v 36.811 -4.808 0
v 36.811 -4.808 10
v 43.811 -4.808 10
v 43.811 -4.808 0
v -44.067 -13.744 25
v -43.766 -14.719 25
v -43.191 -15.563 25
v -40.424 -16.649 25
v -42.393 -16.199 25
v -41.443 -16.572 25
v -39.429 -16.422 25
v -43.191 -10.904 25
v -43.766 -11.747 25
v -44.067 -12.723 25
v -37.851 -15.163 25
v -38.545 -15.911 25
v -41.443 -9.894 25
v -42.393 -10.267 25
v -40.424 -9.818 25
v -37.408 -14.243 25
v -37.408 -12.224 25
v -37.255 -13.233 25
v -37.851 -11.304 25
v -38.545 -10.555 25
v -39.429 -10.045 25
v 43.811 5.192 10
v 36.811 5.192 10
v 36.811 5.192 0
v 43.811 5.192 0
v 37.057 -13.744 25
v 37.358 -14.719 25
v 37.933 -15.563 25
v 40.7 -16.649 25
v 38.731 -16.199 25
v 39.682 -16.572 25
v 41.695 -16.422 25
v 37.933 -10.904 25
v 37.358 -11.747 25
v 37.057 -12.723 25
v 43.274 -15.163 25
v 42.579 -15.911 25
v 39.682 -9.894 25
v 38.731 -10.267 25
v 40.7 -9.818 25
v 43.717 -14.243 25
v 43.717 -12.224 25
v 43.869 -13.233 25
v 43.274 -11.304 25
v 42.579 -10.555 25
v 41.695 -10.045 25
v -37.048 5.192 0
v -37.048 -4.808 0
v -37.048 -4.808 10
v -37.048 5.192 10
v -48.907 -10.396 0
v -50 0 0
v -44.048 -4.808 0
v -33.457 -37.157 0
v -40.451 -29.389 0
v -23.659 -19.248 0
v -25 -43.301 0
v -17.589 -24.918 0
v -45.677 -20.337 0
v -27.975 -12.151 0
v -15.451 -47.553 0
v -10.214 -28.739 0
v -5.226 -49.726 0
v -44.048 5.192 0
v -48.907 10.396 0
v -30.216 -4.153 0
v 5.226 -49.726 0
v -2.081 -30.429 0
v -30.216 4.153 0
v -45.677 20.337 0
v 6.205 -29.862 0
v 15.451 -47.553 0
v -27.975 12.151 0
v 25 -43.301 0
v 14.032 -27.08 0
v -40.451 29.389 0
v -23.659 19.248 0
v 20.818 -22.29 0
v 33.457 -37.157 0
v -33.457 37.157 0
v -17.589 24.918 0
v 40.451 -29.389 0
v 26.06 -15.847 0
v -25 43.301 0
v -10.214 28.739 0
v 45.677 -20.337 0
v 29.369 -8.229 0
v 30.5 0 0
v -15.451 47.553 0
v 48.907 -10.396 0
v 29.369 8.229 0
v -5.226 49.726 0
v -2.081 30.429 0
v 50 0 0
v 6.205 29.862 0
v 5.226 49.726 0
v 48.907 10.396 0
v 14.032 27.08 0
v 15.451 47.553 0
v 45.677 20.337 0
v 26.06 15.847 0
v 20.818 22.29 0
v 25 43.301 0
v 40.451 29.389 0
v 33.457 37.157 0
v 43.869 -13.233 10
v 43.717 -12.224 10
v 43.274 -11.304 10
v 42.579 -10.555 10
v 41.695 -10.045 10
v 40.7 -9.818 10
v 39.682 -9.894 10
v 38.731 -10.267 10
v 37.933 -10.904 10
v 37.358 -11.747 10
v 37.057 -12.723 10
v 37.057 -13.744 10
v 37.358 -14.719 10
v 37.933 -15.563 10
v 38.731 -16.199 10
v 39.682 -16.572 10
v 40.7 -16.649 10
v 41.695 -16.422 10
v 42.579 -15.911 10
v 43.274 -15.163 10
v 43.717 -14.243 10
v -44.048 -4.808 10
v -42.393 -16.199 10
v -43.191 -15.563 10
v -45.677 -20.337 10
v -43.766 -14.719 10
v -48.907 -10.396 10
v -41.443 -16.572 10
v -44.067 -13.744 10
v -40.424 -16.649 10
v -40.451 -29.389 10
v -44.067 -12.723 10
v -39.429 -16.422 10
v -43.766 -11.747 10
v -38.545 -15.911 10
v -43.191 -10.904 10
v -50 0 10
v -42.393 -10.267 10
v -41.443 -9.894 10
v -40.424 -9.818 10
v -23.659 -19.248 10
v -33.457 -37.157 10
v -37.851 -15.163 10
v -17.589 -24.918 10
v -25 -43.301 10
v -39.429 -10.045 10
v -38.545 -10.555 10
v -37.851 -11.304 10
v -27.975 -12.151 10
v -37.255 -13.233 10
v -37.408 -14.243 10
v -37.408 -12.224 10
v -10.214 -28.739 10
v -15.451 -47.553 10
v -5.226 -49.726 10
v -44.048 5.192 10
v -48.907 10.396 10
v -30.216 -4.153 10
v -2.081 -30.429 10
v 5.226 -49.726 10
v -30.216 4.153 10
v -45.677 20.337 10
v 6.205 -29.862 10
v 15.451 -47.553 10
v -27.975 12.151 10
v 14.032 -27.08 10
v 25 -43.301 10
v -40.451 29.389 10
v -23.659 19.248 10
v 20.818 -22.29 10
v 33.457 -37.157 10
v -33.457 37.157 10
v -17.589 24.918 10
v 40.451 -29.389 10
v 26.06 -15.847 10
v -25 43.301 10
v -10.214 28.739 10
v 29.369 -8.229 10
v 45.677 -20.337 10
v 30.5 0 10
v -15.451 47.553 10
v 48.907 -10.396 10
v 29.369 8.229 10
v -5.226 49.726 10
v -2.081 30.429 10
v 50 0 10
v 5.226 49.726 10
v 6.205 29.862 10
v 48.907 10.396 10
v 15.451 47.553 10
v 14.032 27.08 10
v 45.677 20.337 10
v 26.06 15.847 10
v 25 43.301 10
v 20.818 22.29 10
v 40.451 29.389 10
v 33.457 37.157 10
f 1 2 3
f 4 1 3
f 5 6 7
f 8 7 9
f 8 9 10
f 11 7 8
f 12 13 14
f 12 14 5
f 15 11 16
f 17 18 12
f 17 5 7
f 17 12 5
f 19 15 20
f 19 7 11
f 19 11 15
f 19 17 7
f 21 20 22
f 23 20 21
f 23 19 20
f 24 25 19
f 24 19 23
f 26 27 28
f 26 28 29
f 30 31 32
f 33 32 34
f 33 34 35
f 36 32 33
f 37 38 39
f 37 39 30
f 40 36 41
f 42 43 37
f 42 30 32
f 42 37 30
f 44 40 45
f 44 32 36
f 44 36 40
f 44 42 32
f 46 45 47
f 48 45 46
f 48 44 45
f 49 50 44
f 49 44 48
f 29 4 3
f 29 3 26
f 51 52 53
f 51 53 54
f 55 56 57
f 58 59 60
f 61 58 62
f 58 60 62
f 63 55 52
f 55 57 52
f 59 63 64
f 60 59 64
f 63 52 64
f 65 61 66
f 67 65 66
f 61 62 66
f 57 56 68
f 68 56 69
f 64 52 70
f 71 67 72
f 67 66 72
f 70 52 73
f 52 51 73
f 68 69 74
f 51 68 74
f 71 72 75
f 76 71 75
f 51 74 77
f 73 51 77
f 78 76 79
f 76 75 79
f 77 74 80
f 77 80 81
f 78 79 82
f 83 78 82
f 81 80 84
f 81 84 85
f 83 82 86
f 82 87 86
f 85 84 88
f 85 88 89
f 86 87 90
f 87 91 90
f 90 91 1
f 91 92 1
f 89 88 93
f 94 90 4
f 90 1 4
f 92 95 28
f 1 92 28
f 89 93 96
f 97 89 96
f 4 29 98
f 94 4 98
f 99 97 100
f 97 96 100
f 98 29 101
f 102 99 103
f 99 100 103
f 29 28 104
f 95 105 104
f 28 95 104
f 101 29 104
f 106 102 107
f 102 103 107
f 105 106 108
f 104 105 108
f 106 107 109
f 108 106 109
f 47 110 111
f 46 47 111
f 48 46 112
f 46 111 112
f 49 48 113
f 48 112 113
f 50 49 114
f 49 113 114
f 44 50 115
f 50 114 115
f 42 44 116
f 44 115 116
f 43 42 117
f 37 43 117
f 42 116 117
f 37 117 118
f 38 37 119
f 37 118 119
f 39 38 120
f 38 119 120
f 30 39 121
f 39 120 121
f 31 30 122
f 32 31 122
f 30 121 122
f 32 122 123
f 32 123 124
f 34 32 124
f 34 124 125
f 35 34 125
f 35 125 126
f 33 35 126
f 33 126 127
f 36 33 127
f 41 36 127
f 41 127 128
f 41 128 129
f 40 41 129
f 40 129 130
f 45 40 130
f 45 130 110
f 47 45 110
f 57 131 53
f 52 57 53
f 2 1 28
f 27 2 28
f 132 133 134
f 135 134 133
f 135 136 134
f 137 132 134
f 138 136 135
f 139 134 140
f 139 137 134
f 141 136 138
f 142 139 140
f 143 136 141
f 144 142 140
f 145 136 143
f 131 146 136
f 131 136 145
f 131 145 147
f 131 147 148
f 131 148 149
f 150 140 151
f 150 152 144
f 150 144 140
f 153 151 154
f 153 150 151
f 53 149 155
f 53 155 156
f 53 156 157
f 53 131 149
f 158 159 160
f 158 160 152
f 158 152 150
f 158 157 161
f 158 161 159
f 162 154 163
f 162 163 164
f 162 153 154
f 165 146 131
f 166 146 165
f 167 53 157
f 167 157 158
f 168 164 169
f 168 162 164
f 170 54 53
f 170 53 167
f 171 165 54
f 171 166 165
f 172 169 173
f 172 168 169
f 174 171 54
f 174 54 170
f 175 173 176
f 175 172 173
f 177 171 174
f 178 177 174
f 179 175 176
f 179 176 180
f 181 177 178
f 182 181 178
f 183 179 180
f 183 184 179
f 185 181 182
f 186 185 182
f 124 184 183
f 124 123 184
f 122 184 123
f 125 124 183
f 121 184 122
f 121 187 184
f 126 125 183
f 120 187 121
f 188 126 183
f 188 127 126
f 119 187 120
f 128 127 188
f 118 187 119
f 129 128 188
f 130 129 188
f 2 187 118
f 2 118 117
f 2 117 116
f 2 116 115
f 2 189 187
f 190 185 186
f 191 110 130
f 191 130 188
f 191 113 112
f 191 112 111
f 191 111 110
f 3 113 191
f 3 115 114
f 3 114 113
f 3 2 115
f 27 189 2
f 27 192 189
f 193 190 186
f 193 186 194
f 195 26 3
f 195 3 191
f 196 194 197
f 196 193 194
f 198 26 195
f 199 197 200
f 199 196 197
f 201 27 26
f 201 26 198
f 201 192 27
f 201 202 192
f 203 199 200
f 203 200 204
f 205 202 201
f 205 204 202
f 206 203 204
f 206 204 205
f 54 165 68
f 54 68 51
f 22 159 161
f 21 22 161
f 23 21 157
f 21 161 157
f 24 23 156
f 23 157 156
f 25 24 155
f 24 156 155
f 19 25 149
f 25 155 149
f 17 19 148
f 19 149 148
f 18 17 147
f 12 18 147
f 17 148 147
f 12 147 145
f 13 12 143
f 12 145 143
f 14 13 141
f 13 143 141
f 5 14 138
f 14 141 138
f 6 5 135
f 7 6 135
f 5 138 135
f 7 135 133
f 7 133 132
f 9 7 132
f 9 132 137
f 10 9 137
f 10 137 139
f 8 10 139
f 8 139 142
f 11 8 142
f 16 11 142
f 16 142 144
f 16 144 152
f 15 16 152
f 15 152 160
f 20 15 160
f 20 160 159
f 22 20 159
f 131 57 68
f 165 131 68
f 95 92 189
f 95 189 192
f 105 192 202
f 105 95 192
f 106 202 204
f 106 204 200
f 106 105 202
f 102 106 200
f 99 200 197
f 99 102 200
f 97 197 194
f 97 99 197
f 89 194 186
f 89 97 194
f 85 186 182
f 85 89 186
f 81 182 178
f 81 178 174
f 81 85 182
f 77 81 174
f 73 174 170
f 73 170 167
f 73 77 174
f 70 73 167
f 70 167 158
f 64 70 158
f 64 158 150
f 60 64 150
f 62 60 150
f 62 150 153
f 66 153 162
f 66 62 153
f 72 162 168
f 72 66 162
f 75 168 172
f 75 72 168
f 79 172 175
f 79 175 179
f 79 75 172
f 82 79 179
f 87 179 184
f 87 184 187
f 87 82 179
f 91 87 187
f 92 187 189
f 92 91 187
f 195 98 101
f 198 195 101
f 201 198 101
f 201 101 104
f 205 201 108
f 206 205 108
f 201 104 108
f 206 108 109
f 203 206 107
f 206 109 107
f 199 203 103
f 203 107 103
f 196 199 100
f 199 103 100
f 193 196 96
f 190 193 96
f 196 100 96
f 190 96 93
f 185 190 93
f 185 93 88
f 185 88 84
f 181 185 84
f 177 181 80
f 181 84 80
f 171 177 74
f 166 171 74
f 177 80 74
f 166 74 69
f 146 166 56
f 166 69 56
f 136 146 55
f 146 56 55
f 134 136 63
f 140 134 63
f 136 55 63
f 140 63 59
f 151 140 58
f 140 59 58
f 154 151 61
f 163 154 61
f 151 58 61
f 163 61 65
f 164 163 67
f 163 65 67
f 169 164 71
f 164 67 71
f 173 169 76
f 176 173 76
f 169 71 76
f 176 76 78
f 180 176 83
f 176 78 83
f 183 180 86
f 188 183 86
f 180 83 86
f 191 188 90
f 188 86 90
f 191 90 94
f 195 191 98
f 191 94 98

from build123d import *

# Parameters (mm, degrees)
F0_R     = 50
F0_R_2   = 3.425
F0_W     = 7
F0_H     = 10
F0_R_3   = 30.5
F1_DEPTH = 10
F2_DEPTH = 25


# Not quite as in the source:
# - a feature names something its author has since deleted; it is built from what else it names


with BuildPart() as f1:
    # F0 (on Top) → F1 (new body)
    with BuildSketch(Plane.XY):
        Circle(F0_R)
        with Locations((-40.6804330647, -13.233267504)):
            Circle(F0_R_2, mode=Mode.SUBTRACT)
        with Locations((40.4436938465, -13.233267504)):
            Circle(F0_R_2, mode=Mode.SUBTRACT)
        with Locations((-40.547645092, 0.191732496)):
            Rectangle(F0_W, F0_H, mode=Mode.SUBTRACT)
        Circle(F0_R_3, mode=Mode.SUBTRACT)
        with Locations((40.3109058738, 0.191732496)):
            Rectangle(F0_W, F0_H, mode=Mode.SUBTRACT)
        with Locations((-40.6804330647, -13.233267504)):
            Circle(F0_R_2)
        with Locations((40.4436938465, -13.233267504)):
            Circle(F0_R_2)
    extrude(amount=F1_DEPTH)

    # F0 (on Top) → F2 (join)
    with BuildSketch(Plane.XY):
        with Locations((-40.6804330647, -13.233267504)):
            Circle(F0_R_2)
        with Locations((40.4436938465, -13.233267504)):
            Circle(F0_R_2)
    extrude(amount=F2_DEPTH)


solid = f1.part
